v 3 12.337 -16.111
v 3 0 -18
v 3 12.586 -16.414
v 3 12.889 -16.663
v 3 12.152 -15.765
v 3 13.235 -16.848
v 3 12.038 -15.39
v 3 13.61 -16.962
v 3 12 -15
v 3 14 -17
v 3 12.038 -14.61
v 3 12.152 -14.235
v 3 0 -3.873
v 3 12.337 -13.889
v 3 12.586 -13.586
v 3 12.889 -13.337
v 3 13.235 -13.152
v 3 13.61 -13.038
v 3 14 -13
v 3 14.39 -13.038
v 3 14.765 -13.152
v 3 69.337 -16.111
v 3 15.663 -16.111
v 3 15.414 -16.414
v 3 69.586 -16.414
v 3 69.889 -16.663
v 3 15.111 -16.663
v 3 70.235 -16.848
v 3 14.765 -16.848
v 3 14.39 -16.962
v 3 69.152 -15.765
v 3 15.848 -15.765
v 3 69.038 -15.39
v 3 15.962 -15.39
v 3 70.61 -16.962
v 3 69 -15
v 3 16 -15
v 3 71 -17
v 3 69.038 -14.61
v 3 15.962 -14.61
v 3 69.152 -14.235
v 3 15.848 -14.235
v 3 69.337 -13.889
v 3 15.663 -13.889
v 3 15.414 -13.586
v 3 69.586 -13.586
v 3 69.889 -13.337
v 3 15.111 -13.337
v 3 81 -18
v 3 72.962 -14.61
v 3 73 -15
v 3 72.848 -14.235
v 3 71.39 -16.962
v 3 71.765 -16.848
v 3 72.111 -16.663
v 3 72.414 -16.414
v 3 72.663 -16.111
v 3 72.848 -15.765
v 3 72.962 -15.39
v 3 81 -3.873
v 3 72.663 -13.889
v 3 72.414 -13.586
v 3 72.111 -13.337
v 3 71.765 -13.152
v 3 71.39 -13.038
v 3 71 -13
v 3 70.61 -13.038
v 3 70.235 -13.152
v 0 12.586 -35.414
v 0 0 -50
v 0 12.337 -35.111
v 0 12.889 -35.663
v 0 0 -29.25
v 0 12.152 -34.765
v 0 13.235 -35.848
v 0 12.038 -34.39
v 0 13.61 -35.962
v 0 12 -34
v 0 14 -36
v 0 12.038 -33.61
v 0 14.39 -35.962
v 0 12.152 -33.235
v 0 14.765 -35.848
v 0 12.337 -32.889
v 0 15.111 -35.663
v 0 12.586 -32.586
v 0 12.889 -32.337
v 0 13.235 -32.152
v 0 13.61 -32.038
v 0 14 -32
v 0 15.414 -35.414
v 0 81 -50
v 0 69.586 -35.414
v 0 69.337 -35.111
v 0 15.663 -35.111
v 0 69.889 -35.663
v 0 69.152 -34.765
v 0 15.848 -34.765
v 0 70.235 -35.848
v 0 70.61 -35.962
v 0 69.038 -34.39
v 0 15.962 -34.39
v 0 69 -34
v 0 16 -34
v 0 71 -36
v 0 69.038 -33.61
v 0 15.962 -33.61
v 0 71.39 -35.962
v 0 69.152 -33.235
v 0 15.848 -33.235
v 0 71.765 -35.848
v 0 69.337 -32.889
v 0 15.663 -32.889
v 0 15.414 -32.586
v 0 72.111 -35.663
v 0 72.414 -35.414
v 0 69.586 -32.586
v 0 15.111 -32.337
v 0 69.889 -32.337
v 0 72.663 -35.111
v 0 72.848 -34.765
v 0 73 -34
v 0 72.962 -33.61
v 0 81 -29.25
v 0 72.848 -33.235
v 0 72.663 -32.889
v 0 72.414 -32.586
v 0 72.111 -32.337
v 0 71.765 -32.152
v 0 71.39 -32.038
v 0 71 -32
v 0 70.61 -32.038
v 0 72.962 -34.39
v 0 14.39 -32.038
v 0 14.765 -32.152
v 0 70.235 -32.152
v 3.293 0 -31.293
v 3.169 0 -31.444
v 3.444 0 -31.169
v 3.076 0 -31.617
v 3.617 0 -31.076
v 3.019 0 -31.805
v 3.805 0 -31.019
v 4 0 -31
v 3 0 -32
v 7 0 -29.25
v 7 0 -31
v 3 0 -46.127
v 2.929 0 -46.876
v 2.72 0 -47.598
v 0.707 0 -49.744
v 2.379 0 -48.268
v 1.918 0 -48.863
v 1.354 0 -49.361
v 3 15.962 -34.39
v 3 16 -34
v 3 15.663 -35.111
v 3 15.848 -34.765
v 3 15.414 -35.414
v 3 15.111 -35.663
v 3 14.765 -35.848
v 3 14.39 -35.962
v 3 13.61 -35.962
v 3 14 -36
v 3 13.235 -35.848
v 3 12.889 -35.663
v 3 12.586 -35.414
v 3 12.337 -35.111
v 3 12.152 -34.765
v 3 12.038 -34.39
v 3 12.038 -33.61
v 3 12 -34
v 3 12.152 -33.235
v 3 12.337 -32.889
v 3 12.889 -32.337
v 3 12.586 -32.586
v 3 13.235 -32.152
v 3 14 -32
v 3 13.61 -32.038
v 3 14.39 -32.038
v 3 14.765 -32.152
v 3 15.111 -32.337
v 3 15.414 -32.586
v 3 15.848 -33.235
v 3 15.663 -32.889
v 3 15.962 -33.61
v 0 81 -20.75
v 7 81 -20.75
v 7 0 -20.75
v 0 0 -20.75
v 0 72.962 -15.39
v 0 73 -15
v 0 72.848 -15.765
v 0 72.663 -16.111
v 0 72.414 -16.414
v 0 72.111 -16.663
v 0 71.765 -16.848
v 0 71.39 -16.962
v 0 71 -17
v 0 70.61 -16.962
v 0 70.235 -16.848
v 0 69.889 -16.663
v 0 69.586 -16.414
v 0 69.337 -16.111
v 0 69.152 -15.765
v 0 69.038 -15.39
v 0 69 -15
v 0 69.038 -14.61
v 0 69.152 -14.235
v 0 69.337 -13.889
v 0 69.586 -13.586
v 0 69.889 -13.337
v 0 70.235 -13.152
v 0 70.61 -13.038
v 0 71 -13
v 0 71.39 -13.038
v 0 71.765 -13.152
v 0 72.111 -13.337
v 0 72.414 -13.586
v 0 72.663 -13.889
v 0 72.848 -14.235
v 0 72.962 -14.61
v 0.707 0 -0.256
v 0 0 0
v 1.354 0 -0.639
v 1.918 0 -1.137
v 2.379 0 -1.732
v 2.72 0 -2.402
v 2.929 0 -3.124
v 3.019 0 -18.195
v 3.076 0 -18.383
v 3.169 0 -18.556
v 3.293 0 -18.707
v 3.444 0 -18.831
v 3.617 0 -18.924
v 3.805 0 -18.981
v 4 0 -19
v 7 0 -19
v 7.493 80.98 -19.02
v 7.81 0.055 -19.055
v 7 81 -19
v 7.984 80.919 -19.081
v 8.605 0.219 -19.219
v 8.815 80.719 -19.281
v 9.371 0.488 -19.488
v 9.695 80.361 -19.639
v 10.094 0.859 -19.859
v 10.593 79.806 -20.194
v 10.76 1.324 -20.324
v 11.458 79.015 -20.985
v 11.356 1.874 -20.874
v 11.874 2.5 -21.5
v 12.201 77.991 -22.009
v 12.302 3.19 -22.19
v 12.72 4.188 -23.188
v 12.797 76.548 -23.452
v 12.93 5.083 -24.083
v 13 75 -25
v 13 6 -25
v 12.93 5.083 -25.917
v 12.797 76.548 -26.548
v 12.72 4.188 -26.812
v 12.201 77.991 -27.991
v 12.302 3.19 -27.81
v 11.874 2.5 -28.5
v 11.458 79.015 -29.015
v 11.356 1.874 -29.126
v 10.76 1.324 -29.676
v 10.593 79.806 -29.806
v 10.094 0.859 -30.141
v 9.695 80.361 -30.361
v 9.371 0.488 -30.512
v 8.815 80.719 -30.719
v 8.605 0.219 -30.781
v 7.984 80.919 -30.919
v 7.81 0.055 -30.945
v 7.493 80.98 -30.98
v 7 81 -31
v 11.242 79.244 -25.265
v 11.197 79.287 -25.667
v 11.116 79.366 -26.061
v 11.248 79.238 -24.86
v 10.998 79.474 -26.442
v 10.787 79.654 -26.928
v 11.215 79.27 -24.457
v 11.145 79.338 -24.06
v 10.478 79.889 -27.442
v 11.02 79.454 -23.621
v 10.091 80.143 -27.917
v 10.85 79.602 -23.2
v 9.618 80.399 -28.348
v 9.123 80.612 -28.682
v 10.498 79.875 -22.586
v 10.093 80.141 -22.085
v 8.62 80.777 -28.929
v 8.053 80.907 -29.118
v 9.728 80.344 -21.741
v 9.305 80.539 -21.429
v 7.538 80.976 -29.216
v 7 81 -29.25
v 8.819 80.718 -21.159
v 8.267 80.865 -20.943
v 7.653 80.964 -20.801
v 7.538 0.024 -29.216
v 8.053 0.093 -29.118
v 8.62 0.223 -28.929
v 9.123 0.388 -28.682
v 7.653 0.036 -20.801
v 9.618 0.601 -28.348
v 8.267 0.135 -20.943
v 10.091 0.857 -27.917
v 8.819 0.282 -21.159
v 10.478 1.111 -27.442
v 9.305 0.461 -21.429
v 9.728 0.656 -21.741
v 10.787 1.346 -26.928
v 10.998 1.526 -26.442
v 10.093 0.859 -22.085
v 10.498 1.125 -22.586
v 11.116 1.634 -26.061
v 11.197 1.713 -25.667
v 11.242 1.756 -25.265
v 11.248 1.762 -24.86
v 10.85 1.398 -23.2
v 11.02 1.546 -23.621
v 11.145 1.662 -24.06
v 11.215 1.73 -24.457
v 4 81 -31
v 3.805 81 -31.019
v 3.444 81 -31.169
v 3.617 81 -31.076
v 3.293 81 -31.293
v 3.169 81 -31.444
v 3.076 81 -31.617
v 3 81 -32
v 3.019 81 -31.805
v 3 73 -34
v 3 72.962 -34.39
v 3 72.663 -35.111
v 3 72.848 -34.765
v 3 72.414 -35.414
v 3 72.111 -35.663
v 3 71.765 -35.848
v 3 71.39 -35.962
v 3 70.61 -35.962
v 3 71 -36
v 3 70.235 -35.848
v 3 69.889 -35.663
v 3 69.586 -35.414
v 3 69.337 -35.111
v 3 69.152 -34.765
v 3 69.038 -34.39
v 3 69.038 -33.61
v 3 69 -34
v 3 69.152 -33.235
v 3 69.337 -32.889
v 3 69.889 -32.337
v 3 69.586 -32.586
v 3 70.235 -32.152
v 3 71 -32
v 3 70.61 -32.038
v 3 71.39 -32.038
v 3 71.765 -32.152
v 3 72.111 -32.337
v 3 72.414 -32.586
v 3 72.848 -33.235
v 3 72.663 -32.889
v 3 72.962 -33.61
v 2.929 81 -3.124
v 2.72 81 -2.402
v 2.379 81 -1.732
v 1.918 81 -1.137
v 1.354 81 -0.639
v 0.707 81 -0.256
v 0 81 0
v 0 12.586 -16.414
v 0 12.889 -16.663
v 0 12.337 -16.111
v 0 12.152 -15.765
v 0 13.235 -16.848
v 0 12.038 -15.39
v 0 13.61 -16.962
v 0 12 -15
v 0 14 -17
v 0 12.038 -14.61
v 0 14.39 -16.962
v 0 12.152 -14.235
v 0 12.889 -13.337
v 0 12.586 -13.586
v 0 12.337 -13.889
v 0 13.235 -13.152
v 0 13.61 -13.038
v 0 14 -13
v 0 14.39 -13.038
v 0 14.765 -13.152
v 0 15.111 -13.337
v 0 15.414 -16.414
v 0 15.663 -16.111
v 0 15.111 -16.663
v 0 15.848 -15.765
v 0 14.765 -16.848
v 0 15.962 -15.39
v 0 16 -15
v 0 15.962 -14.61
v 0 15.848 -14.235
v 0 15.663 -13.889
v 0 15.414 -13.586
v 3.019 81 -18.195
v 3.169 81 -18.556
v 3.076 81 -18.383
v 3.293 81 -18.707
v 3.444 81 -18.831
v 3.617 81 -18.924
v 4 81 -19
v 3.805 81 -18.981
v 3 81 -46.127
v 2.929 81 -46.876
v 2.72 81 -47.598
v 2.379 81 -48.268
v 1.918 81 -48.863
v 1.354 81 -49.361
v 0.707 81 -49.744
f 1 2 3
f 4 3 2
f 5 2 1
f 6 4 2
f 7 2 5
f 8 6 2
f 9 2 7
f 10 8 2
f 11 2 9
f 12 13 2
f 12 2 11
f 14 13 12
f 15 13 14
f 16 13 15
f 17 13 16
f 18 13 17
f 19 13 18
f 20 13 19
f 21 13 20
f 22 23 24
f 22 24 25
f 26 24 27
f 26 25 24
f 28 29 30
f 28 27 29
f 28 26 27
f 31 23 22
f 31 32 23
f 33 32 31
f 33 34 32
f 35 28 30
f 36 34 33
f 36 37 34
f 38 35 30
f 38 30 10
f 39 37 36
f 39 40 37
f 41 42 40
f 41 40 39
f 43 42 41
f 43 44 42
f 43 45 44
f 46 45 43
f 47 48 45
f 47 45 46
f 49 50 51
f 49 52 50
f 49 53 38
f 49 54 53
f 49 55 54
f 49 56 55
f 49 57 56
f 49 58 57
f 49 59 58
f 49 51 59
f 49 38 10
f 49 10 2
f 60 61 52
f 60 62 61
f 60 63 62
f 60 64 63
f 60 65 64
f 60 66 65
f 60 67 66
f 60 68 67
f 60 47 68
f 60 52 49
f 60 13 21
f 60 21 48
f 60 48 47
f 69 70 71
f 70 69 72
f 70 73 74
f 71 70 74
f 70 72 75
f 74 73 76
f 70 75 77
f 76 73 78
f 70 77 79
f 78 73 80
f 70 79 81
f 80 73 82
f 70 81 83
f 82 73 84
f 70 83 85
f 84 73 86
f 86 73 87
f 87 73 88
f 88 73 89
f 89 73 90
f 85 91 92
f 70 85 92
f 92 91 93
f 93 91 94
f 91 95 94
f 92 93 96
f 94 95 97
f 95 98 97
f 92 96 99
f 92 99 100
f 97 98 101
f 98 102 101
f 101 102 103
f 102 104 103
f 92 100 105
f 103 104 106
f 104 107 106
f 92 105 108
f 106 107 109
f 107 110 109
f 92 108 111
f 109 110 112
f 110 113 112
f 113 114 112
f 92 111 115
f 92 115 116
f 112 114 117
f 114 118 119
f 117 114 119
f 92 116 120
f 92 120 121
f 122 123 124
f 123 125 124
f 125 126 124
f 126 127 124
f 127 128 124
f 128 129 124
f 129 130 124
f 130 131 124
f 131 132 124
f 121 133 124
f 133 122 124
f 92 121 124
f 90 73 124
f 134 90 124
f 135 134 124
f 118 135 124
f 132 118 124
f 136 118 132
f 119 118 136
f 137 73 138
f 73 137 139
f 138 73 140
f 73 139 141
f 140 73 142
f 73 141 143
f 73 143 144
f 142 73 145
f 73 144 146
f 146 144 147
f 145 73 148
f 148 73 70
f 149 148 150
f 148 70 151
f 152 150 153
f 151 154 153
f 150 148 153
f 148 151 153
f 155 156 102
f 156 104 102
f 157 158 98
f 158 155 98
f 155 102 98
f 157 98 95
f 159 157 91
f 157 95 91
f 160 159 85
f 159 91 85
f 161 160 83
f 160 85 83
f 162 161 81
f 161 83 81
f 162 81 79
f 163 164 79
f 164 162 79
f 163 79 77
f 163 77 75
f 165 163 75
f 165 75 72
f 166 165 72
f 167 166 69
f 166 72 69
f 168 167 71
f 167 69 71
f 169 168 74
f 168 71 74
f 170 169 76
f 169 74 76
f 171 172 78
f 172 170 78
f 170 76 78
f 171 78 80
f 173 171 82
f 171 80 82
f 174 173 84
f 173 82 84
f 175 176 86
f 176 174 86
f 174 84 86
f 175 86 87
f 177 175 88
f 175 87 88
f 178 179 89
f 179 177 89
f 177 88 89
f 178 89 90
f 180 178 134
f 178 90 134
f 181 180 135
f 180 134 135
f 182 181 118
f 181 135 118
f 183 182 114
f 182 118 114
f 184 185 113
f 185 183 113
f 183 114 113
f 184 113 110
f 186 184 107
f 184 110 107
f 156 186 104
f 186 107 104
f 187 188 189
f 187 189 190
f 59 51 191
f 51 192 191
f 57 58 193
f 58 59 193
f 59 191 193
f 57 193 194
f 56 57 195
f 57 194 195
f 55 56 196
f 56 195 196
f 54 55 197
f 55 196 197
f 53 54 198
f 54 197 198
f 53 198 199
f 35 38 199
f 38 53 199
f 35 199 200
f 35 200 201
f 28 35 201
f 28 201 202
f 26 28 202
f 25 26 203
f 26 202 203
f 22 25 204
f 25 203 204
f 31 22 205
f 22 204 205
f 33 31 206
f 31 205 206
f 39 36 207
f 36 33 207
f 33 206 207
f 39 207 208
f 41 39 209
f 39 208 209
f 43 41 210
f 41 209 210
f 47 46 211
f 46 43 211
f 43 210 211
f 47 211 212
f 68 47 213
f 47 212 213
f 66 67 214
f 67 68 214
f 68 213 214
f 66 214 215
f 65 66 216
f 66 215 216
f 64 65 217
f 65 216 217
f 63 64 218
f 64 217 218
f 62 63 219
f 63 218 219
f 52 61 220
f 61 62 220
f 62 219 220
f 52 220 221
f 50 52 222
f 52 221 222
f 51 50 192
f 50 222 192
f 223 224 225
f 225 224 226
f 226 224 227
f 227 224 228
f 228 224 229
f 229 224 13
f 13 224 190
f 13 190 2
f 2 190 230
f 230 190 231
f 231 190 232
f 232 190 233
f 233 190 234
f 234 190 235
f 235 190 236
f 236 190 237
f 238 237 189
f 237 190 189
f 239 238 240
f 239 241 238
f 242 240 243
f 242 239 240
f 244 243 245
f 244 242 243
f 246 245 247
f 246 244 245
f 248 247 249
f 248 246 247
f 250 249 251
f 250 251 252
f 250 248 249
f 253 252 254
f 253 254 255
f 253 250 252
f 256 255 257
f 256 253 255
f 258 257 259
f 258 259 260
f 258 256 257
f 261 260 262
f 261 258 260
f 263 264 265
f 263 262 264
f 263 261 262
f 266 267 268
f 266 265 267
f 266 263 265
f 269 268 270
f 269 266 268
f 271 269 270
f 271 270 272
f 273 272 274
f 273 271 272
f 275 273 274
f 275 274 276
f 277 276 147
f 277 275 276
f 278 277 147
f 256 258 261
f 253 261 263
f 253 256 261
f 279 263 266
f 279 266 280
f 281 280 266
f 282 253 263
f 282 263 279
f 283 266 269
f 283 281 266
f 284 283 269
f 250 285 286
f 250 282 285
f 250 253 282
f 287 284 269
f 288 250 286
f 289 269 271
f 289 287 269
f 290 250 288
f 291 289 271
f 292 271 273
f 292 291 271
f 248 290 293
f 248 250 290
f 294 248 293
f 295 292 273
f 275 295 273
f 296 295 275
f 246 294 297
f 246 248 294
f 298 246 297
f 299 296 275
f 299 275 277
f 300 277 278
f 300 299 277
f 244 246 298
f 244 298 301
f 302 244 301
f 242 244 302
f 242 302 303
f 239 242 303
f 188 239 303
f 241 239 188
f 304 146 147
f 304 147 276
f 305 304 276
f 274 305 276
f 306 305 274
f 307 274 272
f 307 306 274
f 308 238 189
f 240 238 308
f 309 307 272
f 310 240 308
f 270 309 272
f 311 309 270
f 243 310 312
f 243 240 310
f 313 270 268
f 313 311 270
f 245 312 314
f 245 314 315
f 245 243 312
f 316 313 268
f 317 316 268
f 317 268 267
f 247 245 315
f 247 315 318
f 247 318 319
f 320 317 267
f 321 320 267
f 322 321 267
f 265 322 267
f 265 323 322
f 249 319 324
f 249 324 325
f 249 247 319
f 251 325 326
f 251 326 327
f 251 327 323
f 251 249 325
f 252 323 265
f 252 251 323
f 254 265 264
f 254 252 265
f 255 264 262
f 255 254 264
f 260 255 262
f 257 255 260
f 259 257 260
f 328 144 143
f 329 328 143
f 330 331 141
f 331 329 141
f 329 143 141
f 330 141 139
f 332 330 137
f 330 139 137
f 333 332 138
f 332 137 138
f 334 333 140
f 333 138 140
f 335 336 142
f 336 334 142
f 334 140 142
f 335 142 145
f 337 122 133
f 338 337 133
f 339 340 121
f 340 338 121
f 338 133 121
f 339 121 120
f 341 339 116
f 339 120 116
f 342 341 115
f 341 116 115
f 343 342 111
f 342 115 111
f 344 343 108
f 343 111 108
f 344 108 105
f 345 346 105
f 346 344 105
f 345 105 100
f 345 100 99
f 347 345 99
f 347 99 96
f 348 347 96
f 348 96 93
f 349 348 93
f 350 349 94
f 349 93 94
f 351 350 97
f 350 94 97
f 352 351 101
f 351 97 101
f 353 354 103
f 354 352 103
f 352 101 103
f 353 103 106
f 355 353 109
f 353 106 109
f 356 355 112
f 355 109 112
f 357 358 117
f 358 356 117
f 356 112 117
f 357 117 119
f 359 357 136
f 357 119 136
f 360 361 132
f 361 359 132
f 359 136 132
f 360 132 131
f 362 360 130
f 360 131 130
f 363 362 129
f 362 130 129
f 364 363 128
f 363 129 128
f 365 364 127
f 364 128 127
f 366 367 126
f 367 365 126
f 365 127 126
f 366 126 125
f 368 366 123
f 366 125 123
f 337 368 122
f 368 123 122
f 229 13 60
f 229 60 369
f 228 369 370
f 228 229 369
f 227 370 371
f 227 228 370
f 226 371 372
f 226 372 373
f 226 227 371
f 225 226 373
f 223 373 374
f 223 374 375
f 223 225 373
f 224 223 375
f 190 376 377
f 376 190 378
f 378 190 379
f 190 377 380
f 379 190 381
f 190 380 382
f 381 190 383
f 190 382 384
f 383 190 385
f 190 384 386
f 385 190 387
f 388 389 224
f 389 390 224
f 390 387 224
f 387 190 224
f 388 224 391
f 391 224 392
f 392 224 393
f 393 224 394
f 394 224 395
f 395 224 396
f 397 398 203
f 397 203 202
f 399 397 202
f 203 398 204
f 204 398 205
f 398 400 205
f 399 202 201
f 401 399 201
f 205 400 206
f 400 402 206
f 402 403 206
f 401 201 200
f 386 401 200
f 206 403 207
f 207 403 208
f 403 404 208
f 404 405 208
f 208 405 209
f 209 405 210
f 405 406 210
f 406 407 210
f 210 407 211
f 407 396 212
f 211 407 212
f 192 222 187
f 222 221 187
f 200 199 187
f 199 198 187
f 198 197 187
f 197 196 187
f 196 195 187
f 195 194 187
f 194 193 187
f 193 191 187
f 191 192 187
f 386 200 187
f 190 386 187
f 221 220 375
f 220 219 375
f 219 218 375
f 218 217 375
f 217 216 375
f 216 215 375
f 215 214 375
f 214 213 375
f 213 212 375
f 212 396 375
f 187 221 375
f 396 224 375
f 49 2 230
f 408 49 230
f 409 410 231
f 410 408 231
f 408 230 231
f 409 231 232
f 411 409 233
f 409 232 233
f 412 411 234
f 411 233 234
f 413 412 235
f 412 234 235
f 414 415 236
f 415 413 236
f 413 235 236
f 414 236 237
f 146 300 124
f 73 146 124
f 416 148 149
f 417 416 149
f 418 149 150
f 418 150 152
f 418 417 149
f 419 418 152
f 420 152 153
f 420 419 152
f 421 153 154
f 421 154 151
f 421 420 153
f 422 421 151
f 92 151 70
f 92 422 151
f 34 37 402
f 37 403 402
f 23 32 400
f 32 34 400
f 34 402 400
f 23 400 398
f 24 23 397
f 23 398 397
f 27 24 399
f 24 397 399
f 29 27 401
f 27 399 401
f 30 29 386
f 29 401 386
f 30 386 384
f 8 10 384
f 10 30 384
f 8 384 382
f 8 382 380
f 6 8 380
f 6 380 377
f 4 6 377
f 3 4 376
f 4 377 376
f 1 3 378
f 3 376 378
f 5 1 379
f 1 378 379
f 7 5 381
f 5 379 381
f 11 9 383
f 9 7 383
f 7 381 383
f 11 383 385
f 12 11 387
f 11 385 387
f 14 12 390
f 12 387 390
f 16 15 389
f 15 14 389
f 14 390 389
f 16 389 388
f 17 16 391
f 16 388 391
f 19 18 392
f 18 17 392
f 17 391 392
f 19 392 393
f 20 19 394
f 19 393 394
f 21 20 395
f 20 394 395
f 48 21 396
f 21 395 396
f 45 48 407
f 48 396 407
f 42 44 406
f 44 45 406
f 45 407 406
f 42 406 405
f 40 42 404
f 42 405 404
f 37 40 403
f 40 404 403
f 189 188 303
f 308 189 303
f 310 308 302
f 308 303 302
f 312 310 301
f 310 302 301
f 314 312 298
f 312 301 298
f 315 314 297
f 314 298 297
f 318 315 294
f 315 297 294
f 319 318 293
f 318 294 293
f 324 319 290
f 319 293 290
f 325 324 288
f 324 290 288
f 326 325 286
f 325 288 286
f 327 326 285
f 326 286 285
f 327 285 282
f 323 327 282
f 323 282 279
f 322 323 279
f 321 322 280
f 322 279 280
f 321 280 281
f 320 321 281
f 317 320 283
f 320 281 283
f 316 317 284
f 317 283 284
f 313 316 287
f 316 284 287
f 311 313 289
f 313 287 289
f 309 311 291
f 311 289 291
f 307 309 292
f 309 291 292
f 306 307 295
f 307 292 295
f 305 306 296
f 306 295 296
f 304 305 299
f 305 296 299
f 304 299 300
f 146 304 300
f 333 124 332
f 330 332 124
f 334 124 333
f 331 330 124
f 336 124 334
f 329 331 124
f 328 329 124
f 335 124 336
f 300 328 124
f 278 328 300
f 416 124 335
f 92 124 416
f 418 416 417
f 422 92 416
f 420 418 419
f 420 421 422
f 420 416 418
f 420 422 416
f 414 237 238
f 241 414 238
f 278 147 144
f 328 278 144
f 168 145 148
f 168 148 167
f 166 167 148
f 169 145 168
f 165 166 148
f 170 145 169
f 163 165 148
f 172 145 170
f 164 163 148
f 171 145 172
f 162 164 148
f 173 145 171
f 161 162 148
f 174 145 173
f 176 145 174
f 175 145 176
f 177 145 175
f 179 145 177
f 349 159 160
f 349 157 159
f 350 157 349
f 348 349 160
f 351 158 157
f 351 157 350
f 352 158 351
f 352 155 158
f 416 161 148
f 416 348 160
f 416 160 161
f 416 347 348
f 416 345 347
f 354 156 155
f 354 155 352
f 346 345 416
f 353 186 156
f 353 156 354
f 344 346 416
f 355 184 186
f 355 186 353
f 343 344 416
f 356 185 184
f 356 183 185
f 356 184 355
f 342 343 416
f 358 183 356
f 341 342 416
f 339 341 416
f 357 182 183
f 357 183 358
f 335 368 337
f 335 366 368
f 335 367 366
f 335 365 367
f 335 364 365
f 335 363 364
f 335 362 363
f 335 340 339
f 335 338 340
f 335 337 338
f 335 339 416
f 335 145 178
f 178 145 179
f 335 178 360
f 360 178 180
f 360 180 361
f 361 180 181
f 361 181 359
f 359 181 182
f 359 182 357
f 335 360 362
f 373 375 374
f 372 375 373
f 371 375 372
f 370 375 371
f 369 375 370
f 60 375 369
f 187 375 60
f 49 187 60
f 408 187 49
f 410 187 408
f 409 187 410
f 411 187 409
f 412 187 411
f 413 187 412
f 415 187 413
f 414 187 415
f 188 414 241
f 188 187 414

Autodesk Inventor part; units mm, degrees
ref_plane "YZ Plane" through (0, 0, 0) normal (1, 0, 0) x (0, 1, 0)
ref_plane "XZ Plane" through (0, 0, 0) normal (0, 1, 0) x (-1, 0, 0)
ref_plane "XY Plane" through (0, 0, 0) normal (0, 0, 1) x (1, 0, 0)
sketch "Sketch1" plane through (0, 0, 0) normal (1, 0, 0) x (0, 1, 0)
  line L0 (0, 0) -> (81, 0)
  line L1 (81, 0) -> (81, -50)
  line L2 (81, -50) -> (0, -50)
  line L3 (0, -50) -> (0, 0)
  circle A0 centre (71, -15) radius 2
  circle A1 centre (71, -34) radius 2
  circle A2 centre (14, -15) radius 2
  circle A3 centre (14, -34) radius 2
  dimension "d0" = 81
  dimension "d1" = 50
  dimension "d2" = 4
  dimension "d3" = 15
  dimension "d4" = 4
  dimension "d5" = 16
  dimension "d6" = 4
  dimension "d7" = 15
  dimension "d8" = 4
  dimension "d9" = 57
  dimension "d11" = 10
  dimension "d12" = 57
  dimension "d13" = 10
extrude "Extrusion1" add sketch "Sketch1" along normal blind 3
sketch "Sketch5" plane through (0, 81, 0) normal (0, 1, 0) x (1, 0, 0)
  circle A0 centre (7, 25) radius 4
  line L0 (0, 0) -> (3, 0) projected
  line L1 (3, 50) -> (3, 0) projected
  dimension "d26" = 8
  dimension "d27" = 25
  dimension "d28" = 4
extrude "Extrusion3" add sketch "Sketch5" against normal blind 81
sketch "Sketch9" plane through (7, 81, -25) normal (0, 1, 0) x (1, 0, 0)
  line L0 (-4, 0) -> (-4, -25) projected
  line L1 (-4, -6) -> (6, -6)
  line L2 (6, -6) -> (6, 6)
  line L3 (6, 6) -> (-4, 6)
  line L4 (-4, 6) -> (-4, -6)
  line L5 (-7, -25) -> (-4, -25) projected
  dimension "d42" = 10
  dimension "d43" = 12
  dimension "d44" = 19
extrude "Extrusion6" add sketch "Sketch9" against normal blind 81
sketch "Sketch10" plane through (0, 81, 0) normal (0, 1, 0) x (1, 0, 0)
  line L0 (3, 19) -> (13, 19) projected
  line L1 (13, 19) -> (13, 31) projected
  line L2 (7, 29.25) -> (0, 29.25)
  line L3 (0, 50) -> (0, 0) projected
  line L4 (7, 20.75) -> (0, 20.75)
  arc A0 (7, 20.75) -> (7, 29.25) centre (7, 25) ccw
  arc A1 (7, 20.75) -> (7, 29.25) centre (7, 25) ccw
  arc A2 (7, 20.75) -> (7, 29.25) centre (7, 25) ccw
  dimension "d55" = 4.25
  dimension "d56" = 4.25
  dimension "d57" = 4.25
extrude "Extrusion8" cut sketch "Sketch10" against normal blind 81
fillet "Fillet4" radius 4 2 edges at (3, 40.5, 0) (3, 40.5, -50)
fillet "Fillet5" radius 1 2 edges at (3, 40.5, -19) (3, 40.5, -31)
fillet "Fillet6" radius 6 4 edges at (13, 81, -25) (13, 0, -25) (13, 40.5, -19) (13, 40.5, -31)
